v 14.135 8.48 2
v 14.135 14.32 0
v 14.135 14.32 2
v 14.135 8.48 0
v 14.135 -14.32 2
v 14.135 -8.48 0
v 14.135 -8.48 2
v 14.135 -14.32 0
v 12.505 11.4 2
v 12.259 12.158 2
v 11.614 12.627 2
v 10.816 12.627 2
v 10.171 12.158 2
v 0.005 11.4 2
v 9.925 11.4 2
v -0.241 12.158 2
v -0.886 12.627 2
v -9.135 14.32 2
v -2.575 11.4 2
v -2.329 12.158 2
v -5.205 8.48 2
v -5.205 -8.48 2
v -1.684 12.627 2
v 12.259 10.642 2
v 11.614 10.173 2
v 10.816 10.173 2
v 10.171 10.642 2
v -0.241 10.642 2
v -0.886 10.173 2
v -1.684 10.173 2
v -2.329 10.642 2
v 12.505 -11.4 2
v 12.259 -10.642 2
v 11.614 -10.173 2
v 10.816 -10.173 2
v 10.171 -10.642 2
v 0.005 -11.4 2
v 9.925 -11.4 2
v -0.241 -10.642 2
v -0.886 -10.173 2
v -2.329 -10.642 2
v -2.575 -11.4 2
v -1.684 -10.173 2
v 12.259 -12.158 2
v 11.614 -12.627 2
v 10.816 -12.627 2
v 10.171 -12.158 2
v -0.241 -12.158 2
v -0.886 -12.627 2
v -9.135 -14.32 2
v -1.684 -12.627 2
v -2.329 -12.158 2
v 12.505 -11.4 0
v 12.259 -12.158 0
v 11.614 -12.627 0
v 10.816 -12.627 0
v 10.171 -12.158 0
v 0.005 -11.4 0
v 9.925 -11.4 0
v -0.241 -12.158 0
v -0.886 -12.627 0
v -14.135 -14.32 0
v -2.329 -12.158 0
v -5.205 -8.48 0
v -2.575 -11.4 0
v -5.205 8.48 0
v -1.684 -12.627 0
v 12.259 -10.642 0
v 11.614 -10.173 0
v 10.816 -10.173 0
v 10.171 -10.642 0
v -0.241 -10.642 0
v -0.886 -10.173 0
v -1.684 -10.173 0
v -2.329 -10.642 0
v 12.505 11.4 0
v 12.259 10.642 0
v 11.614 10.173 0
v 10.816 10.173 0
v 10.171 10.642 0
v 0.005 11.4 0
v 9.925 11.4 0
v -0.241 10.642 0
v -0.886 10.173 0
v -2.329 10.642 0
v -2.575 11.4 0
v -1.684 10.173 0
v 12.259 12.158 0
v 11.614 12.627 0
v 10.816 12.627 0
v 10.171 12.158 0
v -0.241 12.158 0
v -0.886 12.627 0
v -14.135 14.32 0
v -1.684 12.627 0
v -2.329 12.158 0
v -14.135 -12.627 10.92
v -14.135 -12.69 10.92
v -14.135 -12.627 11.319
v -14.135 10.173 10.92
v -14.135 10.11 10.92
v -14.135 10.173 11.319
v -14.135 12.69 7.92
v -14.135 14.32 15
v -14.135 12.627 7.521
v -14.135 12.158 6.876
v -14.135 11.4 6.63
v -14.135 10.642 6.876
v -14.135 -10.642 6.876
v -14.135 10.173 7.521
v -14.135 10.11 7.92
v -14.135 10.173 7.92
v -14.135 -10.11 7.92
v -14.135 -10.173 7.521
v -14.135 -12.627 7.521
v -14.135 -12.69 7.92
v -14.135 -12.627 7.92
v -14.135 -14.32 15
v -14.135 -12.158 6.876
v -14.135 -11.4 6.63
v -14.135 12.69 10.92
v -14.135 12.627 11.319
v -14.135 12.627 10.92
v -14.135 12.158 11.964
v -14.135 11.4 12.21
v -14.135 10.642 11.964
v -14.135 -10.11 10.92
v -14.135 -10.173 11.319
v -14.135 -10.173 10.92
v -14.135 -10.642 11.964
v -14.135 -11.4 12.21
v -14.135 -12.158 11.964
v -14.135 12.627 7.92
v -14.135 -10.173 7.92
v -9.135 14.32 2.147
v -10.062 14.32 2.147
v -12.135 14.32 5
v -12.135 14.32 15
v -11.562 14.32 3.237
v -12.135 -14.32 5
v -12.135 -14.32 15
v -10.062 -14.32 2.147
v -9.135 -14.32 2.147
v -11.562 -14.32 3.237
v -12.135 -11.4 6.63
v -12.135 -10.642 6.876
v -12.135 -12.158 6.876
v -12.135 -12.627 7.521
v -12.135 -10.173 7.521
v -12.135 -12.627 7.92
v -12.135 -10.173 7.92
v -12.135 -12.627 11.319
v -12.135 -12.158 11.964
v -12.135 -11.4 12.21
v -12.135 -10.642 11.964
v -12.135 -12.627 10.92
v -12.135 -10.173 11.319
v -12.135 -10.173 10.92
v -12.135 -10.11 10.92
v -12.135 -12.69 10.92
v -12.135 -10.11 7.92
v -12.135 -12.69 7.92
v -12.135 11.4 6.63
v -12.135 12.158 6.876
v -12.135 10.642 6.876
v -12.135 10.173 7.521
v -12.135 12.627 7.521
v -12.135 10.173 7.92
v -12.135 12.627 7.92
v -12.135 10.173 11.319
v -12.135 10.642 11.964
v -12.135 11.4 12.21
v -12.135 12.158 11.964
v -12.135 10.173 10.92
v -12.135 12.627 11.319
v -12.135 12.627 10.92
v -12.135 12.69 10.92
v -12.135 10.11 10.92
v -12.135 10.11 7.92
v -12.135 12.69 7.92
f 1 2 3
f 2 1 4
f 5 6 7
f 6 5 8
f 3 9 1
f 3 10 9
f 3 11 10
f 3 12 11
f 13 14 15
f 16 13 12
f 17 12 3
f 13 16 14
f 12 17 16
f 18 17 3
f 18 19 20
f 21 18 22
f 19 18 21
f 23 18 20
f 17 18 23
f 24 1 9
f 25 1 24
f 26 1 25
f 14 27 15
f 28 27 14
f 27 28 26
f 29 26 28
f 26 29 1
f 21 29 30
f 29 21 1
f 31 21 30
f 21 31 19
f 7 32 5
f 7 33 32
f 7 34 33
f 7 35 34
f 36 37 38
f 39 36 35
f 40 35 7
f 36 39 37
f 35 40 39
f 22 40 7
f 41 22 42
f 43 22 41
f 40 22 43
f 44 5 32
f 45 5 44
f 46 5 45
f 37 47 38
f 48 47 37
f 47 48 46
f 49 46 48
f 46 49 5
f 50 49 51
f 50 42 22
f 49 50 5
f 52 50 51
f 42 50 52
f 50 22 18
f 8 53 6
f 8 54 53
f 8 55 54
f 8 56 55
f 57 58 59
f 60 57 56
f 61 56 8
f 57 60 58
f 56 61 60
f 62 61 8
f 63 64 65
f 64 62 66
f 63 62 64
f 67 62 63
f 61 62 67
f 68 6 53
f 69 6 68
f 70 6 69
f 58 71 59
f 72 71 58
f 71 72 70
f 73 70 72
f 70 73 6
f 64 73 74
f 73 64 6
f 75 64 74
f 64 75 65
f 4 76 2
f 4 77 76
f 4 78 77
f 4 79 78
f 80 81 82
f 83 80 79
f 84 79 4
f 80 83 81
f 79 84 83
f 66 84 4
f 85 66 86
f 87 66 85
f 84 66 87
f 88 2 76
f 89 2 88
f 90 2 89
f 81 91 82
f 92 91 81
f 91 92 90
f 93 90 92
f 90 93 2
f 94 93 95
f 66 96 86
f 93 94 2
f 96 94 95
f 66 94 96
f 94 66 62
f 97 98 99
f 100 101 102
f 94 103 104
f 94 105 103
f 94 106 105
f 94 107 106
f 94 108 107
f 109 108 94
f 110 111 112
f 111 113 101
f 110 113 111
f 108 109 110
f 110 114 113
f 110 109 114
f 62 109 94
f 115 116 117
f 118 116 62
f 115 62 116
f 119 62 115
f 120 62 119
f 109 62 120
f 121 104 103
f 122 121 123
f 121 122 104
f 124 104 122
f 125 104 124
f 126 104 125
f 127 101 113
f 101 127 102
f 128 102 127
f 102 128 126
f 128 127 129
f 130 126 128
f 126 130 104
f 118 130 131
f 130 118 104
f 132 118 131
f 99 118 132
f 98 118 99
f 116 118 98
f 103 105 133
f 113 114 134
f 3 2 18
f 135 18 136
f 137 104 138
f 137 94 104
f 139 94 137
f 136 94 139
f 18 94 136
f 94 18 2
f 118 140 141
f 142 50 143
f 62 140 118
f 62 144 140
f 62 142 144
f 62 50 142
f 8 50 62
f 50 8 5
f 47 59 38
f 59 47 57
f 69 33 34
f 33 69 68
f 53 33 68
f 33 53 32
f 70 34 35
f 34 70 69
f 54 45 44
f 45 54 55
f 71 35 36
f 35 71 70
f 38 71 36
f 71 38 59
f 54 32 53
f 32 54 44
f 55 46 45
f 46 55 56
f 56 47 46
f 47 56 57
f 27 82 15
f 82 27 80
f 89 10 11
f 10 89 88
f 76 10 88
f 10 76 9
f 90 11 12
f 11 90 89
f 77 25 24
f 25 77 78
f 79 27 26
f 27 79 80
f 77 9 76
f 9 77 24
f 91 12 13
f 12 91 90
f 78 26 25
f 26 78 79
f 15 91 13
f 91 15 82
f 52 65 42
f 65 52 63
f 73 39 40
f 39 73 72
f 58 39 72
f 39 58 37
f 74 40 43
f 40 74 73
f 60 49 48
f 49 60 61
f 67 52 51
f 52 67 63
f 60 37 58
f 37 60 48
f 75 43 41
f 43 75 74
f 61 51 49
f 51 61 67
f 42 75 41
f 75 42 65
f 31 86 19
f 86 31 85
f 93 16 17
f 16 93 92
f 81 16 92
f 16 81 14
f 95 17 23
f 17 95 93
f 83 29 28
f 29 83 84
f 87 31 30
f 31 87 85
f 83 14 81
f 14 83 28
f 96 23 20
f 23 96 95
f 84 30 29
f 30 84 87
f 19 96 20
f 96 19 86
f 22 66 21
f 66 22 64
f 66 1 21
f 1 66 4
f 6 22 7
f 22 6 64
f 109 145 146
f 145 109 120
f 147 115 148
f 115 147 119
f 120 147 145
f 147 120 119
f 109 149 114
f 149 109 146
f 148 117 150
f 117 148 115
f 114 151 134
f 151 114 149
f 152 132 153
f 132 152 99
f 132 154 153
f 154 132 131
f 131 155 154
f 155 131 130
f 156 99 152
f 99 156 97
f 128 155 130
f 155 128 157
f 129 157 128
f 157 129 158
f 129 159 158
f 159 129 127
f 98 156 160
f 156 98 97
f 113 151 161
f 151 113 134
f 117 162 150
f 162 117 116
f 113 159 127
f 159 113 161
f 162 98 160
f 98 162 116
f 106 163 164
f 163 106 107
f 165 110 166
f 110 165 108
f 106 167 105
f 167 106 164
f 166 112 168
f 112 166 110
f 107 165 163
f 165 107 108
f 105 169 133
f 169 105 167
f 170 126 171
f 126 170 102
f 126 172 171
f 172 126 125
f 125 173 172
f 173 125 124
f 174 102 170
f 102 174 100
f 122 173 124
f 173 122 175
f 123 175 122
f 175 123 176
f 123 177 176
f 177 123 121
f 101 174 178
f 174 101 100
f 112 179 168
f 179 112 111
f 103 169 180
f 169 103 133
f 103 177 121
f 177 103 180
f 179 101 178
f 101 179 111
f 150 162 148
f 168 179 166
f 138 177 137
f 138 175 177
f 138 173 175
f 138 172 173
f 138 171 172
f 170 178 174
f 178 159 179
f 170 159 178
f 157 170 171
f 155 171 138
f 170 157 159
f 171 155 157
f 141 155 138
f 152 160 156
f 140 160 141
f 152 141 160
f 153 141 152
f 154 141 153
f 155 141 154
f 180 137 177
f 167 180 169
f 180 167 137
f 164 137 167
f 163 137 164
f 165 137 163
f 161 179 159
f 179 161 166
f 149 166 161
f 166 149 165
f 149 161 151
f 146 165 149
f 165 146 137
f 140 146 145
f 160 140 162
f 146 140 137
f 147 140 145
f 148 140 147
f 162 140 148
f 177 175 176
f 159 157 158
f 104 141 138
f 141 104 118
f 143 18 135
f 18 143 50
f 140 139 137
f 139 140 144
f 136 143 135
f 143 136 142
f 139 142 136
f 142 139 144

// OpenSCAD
// file: config.scad
// Units are mm

$fn = 10;

// Measured on PCB:
hole_radius = 2.58/2;
hole_short_distance = 12.5;
hole_long_distance = 22.8;
hole_edge_clearance = 2.63; // Edge of hole to pins.

// Measured elsewhere (bracket, etc.):
center_from_left = 19.1;

// Made-up numbers:
pin_margin = 1;
plate_thickness = 2;
support_radius = 3;
bracket_height = 15;
bracket_hole_length = 3; // Between centers of holes.
bracket_thickness = plate_thickness;

// Computed:
hole_center_clearance = hole_edge_clearance + hole_radius;
arm_radius = hole_center_clearance - pin_margin;
center_from_right = arm_radius + hole_short_distance/2;
plate_width = center_from_right + center_from_left;
plate_height = hole_long_distance + arm_radius*2;

// This hole is along the X axis. Z is the bottom of the hole.
// It goes from X = 0 to X = +.
module bracket_hole(y, z, length) {
    translate ([-bracket_thickness/2, y, z]) {
        rotate ([0, 90, 0]) {
            cylinder(bracket_thickness*2, hole_radius, hole_radius);
        }
    }
    translate ([-bracket_thickness/2, y, z + length]) {
        rotate ([0, 90, 0]) {
            cylinder(bracket_thickness*2, hole_radius, hole_radius);
        }
    }
    translate ([-bracket_thickness/2, y - hole_radius, z]) {
        cube([bracket_thickness*2, hole_radius*2, length]);
    }
}
// main file
// Holder of the AS5045 PCB. Units are mm.

include <config.scad>;

module screw_hole(x, y) {
    translate ([x, y, -plate_thickness/2]) {
        cylinder(plate_thickness*2, hole_radius, hole_radius);
    }
}

module plate() {
    left_hole_x = plate_width - arm_radius - hole_short_distance;
    difference () {
        cube([plate_width, plate_height, plate_thickness]);
        screw_hole(plate_width - arm_radius, arm_radius);
        screw_hole(plate_width - arm_radius, plate_height - arm_radius);
        screw_hole(left_hole_x, arm_radius);
        screw_hole(left_hole_x, plate_height - arm_radius);
        translate ([left_hole_x - arm_radius - 1, 2*arm_radius, -plate_thickness/2]) {
            cube([plate_width, plate_height - 4*arm_radius, plate_thickness*2]);
        }
    }
}

module bracket() {
    difference () {
        cube([bracket_thickness, plate_height, bracket_height]);
        bracket_hole(arm_radius, arm_radius + support_radius + plate_thickness, bracket_hole_length);
        bracket_hole(plate_height - arm_radius, arm_radius + support_radius + plate_thickness, bracket_hole_length);
    }
}

module support() {
    difference() {
        cube([bracket_thickness + support_radius, plate_height, plate_thickness + support_radius]);
        translate ([bracket_thickness + support_radius, -1, plate_thickness + support_radius]) {
            rotate ([-90, 0, 0]) {
                cylinder(plate_height + 2, support_radius, support_radius);
            }
        }
    }
}

translate ([-plate_width/2, -plate_height/2, 0]) {
    plate();
    bracket();
    support();
}
